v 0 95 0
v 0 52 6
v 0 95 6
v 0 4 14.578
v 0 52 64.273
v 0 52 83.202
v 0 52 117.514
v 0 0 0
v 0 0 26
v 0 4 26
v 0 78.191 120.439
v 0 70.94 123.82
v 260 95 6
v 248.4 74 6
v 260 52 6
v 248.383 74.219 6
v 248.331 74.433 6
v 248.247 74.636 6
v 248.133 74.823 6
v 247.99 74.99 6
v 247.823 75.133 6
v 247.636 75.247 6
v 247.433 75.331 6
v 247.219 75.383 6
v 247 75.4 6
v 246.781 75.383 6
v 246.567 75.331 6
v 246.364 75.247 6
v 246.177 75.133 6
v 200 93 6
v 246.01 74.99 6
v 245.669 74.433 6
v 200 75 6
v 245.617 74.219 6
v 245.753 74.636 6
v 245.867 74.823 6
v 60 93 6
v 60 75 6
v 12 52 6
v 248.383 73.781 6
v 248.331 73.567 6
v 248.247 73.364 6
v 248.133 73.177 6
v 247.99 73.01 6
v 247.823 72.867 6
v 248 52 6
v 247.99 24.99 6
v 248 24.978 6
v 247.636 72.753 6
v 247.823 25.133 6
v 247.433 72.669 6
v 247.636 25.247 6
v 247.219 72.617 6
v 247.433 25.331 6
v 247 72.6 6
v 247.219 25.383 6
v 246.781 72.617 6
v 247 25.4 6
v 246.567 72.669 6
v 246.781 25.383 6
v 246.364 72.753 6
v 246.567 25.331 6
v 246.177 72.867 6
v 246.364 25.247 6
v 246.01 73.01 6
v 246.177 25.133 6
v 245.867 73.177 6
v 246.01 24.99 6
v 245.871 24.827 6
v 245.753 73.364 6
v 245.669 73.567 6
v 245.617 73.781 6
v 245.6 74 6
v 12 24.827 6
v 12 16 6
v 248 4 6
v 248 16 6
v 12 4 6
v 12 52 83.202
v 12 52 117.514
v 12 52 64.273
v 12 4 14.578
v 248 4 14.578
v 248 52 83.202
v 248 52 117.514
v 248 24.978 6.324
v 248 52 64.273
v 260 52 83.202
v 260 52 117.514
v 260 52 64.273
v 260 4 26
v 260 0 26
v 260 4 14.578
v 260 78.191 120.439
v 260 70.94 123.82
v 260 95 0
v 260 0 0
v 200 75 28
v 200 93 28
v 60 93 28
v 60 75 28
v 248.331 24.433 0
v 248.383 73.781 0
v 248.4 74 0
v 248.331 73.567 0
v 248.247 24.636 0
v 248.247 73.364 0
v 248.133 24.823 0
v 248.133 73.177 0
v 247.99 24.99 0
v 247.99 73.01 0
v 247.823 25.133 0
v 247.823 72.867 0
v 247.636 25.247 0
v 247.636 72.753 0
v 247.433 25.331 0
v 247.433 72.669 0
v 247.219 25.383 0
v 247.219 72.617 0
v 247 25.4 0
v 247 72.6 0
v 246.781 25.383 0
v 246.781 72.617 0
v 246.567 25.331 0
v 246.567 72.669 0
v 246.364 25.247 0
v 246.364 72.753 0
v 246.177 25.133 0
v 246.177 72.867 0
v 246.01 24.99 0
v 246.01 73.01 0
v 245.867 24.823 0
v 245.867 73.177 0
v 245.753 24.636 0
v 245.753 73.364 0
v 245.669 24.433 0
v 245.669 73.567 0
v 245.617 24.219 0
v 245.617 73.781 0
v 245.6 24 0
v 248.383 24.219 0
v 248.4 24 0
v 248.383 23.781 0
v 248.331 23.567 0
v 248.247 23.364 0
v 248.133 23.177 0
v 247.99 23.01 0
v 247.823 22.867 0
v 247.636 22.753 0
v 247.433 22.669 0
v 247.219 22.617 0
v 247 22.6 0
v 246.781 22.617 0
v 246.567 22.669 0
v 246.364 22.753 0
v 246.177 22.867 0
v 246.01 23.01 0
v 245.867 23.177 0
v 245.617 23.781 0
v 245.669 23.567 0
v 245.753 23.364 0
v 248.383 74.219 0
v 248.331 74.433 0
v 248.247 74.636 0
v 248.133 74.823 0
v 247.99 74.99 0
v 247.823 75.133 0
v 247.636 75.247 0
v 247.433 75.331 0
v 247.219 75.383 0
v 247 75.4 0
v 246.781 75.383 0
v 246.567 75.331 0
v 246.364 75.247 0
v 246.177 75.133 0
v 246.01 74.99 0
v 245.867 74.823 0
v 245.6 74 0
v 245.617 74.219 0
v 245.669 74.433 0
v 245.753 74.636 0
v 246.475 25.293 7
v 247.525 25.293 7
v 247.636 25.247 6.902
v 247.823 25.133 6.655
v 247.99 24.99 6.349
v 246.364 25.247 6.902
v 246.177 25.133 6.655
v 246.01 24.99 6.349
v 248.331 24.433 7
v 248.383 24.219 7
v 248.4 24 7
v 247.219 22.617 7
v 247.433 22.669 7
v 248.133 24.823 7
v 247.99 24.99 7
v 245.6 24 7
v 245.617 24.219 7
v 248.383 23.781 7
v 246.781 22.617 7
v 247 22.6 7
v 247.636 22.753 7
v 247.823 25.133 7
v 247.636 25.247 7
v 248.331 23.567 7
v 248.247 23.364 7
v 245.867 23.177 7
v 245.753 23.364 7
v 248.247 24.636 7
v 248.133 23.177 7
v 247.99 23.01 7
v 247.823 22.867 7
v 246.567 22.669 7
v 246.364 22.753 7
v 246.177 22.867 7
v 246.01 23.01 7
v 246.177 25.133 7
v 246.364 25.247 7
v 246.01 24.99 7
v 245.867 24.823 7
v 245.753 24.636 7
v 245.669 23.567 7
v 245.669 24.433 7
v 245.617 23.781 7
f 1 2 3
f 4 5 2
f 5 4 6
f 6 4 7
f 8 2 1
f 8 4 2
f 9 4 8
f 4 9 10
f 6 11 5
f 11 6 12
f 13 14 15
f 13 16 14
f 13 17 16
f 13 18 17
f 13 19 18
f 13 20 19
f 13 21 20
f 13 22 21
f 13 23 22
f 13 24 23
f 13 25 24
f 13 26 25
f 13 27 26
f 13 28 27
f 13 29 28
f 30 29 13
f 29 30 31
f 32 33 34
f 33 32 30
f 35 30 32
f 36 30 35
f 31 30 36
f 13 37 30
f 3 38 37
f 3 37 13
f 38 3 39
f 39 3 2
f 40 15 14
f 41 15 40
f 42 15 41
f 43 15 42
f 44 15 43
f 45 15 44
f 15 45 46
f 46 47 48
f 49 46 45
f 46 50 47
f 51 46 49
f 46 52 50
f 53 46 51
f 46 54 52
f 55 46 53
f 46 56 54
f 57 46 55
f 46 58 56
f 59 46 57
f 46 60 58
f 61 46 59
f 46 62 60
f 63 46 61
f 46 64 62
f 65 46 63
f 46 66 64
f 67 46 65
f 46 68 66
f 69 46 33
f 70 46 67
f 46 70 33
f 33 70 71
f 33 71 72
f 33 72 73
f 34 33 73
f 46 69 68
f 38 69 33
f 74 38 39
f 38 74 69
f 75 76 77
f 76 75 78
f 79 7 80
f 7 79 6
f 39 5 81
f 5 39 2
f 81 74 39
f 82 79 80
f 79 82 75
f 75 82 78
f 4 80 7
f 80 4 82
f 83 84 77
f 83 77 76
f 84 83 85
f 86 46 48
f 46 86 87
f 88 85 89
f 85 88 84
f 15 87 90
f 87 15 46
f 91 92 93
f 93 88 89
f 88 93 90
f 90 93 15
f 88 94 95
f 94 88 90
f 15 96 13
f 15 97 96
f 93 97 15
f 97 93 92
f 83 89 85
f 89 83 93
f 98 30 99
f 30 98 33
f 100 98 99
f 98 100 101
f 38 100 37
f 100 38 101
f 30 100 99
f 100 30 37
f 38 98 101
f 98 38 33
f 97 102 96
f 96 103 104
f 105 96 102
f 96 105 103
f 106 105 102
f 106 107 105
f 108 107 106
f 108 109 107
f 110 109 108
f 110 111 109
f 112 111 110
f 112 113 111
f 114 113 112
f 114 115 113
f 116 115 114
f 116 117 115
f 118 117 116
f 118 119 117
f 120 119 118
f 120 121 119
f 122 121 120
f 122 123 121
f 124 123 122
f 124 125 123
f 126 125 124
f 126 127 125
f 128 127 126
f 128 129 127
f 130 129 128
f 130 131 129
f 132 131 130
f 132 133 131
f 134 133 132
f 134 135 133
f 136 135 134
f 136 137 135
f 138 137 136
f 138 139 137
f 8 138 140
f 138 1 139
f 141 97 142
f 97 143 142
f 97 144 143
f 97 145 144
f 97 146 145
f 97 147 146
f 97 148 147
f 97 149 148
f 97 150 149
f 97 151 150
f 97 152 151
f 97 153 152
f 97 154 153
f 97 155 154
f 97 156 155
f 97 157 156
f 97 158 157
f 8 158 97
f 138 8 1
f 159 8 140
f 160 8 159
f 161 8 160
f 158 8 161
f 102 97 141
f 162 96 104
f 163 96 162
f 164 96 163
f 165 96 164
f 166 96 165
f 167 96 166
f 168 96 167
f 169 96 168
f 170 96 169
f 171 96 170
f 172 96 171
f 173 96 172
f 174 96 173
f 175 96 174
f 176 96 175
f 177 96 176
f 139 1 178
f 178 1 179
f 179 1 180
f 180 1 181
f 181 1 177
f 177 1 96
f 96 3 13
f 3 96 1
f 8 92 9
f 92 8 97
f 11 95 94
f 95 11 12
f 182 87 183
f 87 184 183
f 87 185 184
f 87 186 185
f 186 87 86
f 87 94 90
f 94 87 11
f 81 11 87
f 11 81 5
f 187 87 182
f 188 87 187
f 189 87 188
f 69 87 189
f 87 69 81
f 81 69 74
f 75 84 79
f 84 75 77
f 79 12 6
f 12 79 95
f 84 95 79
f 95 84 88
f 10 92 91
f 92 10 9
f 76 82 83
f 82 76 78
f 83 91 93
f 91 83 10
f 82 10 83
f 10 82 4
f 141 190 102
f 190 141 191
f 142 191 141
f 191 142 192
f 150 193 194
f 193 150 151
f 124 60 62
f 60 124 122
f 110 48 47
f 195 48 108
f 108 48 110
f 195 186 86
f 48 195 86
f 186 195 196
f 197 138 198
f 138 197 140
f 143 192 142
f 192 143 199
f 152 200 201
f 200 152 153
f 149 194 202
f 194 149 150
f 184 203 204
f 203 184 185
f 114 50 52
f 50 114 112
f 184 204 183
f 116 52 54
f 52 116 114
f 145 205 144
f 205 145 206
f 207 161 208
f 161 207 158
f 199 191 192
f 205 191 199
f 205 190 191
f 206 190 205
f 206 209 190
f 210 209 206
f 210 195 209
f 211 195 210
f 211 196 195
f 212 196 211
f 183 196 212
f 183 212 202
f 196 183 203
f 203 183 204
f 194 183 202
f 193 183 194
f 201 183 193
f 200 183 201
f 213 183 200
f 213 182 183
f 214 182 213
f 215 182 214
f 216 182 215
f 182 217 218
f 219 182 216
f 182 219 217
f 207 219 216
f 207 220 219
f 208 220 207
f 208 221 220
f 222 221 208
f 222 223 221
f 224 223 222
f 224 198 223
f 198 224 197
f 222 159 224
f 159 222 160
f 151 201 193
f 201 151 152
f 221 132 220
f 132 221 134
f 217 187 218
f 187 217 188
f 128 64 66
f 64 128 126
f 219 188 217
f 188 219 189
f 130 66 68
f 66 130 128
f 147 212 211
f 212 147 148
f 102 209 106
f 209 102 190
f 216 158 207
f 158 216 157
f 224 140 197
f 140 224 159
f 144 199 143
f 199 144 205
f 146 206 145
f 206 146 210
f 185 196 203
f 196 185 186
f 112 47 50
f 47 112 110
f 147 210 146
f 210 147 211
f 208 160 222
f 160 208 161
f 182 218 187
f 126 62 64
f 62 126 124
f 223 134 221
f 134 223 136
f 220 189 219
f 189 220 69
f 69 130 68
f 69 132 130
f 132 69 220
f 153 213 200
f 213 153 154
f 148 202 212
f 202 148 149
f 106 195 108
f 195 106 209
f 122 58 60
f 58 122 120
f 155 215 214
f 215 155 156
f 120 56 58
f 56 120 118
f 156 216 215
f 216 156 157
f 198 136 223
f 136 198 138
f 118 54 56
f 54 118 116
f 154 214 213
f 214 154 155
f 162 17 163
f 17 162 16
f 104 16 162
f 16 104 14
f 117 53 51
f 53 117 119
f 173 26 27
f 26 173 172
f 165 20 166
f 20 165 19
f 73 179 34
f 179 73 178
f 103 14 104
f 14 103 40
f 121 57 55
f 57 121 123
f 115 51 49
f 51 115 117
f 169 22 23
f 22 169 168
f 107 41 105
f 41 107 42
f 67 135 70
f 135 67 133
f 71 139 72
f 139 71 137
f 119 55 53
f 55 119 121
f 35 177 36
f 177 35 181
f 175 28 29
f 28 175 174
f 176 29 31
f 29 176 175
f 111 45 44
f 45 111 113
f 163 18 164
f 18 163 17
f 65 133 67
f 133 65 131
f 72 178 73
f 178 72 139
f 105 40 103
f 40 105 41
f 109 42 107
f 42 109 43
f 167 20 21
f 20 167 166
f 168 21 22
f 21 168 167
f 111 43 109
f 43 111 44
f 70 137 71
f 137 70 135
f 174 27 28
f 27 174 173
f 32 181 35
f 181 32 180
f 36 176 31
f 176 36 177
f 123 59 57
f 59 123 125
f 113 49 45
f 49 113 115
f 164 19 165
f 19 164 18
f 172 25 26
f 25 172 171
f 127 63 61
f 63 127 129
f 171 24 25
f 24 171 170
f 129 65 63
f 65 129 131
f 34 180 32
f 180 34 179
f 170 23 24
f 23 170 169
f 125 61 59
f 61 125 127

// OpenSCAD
// file: vj_rig_stand_common.scad
// vj_rig_stand_common.scad — shared library for the VJ rig stand.
//
// Holds an iPad (TouchOSC) in an angled cradle behind the keyboard, an Apple
// Magic Trackpad in a tray that partly frames the keyboard's right side, and a
// 3x Lightning cable holder. Two parts (combined unit is wider than the bed):
//
//   vj_cradle()  — iPad cradle + cable bar (left/center section)
//   vj_tray()    — trackpad tray + connecting arm (right section)
//
// They bolt together at a flange (2 screws; glue-compatible). Variants
// `vj_rig_stand_cradle.scad` / `_tray.scad` `include` this file.

/* [iPad cradle] */
cw        = 260;   // cradle width (iPad 8 cased ≈ 257); keeps the part under the 270 bed
ipad_ang  = 65;    // lean from horizontal
chan_w    = 16;    // bottom channel for the cased iPad (flip cover folds behind)
panel_t   = 8;     // rest-panel thickness
panel_len = 130;   // rest-panel length up the slope
lip_h     = 20;    // front lip catching the iPad bottom edge
gusset_d  = 52;    // wedge depth (front to vertical back)
foot_d    = 95;    // base foot depth

/* [Trackpad tray] */
tp_w   = 160; tp_d = 115;   // Magic Trackpad
tp_wall = 5; tp_lip = 11;   // tray walls / lip
arm_w  = 44;                // connecting arm width
tray_fwd = 58;              // how far the tray is slid forward of the cradle front

/* [Cables] */
cable_n = 3; cable_d = 9; cable_pitch = 40;

/* [Build] */
base_t = 6;
join_overlap = 24;          // cradle ledge width the tray bolts onto
screw_d = 3.6; screw_head = 7; pilot_d = 2.8;
$fn = 40;

// joint screws: in the cradle's right edge; the tray's arm laps on top and bolts down
join_screws = [[cw - 13, 24], [cw - 13, 74]];

module vj_cradle() {
    difference() {
        union() {
            cube([cw, foot_d, base_t]);                                   // base foot
            for (x = [0, cw - 12]) translate([x, 0, base_t]) rotate([90, 0, 90]) // side gussets
                linear_extrude(12) polygon([[0,0], [gusset_d,0], [gusset_d, gusset_d*tan(ipad_ang)]]);
            translate([0, chan_w, base_t]) rotate([-(90 - ipad_ang), 0, 0])      // iPad rest panel
                cube([cw, panel_t, panel_len]);
            cube([cw, 4, base_t + lip_h]);                                // front lip / channel front
            difference() {                                                // cable bar
                translate([cw/2 - (cable_n*cable_pitch)/2 - 10, foot_d - 20, base_t]) cube([cable_n*cable_pitch + 20, 18, 22]);
                for (i = [0 : cable_n-1]) translate([cw/2 + (i - (cable_n-1)/2)*cable_pitch, foot_d - 26, base_t + 14]) rotate([90,0,0]) cylinder(d = cable_d, h = 30);
            }
        }
        for (p = join_screws) translate([p[0], p[1], -1]) cylinder(h = base_t + 2, d = pilot_d); // pilots (screw from above)
    }
}

module vj_tray() {
    difference() {
        union() {
            // arm laps over the cradle's right edge (z = base_t) and reaches the tray
            translate([cw - join_overlap, 0, base_t]) cube([join_overlap + arm_w, foot_d, base_t]);
            translate([cw + 8, -tray_fwd, 0]) difference() {                          // trackpad tray (on desk)
                cube([tp_w + 2*tp_wall, tp_d + tp_wall, base_t + tp_lip]);
                translate([tp_wall, tp_wall, base_t]) cube([tp_w, tp_d, tp_lip + 1]);
                translate([(tp_w + 2*tp_wall)/2 - 25, -1, base_t]) cube([50, tp_wall + 2, tp_lip + 1]); // finger relief
            }
        }
        for (p = join_screws) translate([p[0], p[1], base_t - 1]) {                    // countersunk screws down into cradle
            cylinder(h = base_t + 2, d = screw_d);
            translate([0, 0, 1]) cylinder(h = 4, d1 = screw_d, d2 = screw_head);
        }
    }
}
// main file
// vj_rig_stand_cradle — iPad cradle + 3x Lightning cable bar (left/center section).
// Render: openscad -o ..._cradle.stl --export-format binstl vj_rig_stand_cradle.scad
include <vj_rig_stand_common.scad>

vj_cradle();
